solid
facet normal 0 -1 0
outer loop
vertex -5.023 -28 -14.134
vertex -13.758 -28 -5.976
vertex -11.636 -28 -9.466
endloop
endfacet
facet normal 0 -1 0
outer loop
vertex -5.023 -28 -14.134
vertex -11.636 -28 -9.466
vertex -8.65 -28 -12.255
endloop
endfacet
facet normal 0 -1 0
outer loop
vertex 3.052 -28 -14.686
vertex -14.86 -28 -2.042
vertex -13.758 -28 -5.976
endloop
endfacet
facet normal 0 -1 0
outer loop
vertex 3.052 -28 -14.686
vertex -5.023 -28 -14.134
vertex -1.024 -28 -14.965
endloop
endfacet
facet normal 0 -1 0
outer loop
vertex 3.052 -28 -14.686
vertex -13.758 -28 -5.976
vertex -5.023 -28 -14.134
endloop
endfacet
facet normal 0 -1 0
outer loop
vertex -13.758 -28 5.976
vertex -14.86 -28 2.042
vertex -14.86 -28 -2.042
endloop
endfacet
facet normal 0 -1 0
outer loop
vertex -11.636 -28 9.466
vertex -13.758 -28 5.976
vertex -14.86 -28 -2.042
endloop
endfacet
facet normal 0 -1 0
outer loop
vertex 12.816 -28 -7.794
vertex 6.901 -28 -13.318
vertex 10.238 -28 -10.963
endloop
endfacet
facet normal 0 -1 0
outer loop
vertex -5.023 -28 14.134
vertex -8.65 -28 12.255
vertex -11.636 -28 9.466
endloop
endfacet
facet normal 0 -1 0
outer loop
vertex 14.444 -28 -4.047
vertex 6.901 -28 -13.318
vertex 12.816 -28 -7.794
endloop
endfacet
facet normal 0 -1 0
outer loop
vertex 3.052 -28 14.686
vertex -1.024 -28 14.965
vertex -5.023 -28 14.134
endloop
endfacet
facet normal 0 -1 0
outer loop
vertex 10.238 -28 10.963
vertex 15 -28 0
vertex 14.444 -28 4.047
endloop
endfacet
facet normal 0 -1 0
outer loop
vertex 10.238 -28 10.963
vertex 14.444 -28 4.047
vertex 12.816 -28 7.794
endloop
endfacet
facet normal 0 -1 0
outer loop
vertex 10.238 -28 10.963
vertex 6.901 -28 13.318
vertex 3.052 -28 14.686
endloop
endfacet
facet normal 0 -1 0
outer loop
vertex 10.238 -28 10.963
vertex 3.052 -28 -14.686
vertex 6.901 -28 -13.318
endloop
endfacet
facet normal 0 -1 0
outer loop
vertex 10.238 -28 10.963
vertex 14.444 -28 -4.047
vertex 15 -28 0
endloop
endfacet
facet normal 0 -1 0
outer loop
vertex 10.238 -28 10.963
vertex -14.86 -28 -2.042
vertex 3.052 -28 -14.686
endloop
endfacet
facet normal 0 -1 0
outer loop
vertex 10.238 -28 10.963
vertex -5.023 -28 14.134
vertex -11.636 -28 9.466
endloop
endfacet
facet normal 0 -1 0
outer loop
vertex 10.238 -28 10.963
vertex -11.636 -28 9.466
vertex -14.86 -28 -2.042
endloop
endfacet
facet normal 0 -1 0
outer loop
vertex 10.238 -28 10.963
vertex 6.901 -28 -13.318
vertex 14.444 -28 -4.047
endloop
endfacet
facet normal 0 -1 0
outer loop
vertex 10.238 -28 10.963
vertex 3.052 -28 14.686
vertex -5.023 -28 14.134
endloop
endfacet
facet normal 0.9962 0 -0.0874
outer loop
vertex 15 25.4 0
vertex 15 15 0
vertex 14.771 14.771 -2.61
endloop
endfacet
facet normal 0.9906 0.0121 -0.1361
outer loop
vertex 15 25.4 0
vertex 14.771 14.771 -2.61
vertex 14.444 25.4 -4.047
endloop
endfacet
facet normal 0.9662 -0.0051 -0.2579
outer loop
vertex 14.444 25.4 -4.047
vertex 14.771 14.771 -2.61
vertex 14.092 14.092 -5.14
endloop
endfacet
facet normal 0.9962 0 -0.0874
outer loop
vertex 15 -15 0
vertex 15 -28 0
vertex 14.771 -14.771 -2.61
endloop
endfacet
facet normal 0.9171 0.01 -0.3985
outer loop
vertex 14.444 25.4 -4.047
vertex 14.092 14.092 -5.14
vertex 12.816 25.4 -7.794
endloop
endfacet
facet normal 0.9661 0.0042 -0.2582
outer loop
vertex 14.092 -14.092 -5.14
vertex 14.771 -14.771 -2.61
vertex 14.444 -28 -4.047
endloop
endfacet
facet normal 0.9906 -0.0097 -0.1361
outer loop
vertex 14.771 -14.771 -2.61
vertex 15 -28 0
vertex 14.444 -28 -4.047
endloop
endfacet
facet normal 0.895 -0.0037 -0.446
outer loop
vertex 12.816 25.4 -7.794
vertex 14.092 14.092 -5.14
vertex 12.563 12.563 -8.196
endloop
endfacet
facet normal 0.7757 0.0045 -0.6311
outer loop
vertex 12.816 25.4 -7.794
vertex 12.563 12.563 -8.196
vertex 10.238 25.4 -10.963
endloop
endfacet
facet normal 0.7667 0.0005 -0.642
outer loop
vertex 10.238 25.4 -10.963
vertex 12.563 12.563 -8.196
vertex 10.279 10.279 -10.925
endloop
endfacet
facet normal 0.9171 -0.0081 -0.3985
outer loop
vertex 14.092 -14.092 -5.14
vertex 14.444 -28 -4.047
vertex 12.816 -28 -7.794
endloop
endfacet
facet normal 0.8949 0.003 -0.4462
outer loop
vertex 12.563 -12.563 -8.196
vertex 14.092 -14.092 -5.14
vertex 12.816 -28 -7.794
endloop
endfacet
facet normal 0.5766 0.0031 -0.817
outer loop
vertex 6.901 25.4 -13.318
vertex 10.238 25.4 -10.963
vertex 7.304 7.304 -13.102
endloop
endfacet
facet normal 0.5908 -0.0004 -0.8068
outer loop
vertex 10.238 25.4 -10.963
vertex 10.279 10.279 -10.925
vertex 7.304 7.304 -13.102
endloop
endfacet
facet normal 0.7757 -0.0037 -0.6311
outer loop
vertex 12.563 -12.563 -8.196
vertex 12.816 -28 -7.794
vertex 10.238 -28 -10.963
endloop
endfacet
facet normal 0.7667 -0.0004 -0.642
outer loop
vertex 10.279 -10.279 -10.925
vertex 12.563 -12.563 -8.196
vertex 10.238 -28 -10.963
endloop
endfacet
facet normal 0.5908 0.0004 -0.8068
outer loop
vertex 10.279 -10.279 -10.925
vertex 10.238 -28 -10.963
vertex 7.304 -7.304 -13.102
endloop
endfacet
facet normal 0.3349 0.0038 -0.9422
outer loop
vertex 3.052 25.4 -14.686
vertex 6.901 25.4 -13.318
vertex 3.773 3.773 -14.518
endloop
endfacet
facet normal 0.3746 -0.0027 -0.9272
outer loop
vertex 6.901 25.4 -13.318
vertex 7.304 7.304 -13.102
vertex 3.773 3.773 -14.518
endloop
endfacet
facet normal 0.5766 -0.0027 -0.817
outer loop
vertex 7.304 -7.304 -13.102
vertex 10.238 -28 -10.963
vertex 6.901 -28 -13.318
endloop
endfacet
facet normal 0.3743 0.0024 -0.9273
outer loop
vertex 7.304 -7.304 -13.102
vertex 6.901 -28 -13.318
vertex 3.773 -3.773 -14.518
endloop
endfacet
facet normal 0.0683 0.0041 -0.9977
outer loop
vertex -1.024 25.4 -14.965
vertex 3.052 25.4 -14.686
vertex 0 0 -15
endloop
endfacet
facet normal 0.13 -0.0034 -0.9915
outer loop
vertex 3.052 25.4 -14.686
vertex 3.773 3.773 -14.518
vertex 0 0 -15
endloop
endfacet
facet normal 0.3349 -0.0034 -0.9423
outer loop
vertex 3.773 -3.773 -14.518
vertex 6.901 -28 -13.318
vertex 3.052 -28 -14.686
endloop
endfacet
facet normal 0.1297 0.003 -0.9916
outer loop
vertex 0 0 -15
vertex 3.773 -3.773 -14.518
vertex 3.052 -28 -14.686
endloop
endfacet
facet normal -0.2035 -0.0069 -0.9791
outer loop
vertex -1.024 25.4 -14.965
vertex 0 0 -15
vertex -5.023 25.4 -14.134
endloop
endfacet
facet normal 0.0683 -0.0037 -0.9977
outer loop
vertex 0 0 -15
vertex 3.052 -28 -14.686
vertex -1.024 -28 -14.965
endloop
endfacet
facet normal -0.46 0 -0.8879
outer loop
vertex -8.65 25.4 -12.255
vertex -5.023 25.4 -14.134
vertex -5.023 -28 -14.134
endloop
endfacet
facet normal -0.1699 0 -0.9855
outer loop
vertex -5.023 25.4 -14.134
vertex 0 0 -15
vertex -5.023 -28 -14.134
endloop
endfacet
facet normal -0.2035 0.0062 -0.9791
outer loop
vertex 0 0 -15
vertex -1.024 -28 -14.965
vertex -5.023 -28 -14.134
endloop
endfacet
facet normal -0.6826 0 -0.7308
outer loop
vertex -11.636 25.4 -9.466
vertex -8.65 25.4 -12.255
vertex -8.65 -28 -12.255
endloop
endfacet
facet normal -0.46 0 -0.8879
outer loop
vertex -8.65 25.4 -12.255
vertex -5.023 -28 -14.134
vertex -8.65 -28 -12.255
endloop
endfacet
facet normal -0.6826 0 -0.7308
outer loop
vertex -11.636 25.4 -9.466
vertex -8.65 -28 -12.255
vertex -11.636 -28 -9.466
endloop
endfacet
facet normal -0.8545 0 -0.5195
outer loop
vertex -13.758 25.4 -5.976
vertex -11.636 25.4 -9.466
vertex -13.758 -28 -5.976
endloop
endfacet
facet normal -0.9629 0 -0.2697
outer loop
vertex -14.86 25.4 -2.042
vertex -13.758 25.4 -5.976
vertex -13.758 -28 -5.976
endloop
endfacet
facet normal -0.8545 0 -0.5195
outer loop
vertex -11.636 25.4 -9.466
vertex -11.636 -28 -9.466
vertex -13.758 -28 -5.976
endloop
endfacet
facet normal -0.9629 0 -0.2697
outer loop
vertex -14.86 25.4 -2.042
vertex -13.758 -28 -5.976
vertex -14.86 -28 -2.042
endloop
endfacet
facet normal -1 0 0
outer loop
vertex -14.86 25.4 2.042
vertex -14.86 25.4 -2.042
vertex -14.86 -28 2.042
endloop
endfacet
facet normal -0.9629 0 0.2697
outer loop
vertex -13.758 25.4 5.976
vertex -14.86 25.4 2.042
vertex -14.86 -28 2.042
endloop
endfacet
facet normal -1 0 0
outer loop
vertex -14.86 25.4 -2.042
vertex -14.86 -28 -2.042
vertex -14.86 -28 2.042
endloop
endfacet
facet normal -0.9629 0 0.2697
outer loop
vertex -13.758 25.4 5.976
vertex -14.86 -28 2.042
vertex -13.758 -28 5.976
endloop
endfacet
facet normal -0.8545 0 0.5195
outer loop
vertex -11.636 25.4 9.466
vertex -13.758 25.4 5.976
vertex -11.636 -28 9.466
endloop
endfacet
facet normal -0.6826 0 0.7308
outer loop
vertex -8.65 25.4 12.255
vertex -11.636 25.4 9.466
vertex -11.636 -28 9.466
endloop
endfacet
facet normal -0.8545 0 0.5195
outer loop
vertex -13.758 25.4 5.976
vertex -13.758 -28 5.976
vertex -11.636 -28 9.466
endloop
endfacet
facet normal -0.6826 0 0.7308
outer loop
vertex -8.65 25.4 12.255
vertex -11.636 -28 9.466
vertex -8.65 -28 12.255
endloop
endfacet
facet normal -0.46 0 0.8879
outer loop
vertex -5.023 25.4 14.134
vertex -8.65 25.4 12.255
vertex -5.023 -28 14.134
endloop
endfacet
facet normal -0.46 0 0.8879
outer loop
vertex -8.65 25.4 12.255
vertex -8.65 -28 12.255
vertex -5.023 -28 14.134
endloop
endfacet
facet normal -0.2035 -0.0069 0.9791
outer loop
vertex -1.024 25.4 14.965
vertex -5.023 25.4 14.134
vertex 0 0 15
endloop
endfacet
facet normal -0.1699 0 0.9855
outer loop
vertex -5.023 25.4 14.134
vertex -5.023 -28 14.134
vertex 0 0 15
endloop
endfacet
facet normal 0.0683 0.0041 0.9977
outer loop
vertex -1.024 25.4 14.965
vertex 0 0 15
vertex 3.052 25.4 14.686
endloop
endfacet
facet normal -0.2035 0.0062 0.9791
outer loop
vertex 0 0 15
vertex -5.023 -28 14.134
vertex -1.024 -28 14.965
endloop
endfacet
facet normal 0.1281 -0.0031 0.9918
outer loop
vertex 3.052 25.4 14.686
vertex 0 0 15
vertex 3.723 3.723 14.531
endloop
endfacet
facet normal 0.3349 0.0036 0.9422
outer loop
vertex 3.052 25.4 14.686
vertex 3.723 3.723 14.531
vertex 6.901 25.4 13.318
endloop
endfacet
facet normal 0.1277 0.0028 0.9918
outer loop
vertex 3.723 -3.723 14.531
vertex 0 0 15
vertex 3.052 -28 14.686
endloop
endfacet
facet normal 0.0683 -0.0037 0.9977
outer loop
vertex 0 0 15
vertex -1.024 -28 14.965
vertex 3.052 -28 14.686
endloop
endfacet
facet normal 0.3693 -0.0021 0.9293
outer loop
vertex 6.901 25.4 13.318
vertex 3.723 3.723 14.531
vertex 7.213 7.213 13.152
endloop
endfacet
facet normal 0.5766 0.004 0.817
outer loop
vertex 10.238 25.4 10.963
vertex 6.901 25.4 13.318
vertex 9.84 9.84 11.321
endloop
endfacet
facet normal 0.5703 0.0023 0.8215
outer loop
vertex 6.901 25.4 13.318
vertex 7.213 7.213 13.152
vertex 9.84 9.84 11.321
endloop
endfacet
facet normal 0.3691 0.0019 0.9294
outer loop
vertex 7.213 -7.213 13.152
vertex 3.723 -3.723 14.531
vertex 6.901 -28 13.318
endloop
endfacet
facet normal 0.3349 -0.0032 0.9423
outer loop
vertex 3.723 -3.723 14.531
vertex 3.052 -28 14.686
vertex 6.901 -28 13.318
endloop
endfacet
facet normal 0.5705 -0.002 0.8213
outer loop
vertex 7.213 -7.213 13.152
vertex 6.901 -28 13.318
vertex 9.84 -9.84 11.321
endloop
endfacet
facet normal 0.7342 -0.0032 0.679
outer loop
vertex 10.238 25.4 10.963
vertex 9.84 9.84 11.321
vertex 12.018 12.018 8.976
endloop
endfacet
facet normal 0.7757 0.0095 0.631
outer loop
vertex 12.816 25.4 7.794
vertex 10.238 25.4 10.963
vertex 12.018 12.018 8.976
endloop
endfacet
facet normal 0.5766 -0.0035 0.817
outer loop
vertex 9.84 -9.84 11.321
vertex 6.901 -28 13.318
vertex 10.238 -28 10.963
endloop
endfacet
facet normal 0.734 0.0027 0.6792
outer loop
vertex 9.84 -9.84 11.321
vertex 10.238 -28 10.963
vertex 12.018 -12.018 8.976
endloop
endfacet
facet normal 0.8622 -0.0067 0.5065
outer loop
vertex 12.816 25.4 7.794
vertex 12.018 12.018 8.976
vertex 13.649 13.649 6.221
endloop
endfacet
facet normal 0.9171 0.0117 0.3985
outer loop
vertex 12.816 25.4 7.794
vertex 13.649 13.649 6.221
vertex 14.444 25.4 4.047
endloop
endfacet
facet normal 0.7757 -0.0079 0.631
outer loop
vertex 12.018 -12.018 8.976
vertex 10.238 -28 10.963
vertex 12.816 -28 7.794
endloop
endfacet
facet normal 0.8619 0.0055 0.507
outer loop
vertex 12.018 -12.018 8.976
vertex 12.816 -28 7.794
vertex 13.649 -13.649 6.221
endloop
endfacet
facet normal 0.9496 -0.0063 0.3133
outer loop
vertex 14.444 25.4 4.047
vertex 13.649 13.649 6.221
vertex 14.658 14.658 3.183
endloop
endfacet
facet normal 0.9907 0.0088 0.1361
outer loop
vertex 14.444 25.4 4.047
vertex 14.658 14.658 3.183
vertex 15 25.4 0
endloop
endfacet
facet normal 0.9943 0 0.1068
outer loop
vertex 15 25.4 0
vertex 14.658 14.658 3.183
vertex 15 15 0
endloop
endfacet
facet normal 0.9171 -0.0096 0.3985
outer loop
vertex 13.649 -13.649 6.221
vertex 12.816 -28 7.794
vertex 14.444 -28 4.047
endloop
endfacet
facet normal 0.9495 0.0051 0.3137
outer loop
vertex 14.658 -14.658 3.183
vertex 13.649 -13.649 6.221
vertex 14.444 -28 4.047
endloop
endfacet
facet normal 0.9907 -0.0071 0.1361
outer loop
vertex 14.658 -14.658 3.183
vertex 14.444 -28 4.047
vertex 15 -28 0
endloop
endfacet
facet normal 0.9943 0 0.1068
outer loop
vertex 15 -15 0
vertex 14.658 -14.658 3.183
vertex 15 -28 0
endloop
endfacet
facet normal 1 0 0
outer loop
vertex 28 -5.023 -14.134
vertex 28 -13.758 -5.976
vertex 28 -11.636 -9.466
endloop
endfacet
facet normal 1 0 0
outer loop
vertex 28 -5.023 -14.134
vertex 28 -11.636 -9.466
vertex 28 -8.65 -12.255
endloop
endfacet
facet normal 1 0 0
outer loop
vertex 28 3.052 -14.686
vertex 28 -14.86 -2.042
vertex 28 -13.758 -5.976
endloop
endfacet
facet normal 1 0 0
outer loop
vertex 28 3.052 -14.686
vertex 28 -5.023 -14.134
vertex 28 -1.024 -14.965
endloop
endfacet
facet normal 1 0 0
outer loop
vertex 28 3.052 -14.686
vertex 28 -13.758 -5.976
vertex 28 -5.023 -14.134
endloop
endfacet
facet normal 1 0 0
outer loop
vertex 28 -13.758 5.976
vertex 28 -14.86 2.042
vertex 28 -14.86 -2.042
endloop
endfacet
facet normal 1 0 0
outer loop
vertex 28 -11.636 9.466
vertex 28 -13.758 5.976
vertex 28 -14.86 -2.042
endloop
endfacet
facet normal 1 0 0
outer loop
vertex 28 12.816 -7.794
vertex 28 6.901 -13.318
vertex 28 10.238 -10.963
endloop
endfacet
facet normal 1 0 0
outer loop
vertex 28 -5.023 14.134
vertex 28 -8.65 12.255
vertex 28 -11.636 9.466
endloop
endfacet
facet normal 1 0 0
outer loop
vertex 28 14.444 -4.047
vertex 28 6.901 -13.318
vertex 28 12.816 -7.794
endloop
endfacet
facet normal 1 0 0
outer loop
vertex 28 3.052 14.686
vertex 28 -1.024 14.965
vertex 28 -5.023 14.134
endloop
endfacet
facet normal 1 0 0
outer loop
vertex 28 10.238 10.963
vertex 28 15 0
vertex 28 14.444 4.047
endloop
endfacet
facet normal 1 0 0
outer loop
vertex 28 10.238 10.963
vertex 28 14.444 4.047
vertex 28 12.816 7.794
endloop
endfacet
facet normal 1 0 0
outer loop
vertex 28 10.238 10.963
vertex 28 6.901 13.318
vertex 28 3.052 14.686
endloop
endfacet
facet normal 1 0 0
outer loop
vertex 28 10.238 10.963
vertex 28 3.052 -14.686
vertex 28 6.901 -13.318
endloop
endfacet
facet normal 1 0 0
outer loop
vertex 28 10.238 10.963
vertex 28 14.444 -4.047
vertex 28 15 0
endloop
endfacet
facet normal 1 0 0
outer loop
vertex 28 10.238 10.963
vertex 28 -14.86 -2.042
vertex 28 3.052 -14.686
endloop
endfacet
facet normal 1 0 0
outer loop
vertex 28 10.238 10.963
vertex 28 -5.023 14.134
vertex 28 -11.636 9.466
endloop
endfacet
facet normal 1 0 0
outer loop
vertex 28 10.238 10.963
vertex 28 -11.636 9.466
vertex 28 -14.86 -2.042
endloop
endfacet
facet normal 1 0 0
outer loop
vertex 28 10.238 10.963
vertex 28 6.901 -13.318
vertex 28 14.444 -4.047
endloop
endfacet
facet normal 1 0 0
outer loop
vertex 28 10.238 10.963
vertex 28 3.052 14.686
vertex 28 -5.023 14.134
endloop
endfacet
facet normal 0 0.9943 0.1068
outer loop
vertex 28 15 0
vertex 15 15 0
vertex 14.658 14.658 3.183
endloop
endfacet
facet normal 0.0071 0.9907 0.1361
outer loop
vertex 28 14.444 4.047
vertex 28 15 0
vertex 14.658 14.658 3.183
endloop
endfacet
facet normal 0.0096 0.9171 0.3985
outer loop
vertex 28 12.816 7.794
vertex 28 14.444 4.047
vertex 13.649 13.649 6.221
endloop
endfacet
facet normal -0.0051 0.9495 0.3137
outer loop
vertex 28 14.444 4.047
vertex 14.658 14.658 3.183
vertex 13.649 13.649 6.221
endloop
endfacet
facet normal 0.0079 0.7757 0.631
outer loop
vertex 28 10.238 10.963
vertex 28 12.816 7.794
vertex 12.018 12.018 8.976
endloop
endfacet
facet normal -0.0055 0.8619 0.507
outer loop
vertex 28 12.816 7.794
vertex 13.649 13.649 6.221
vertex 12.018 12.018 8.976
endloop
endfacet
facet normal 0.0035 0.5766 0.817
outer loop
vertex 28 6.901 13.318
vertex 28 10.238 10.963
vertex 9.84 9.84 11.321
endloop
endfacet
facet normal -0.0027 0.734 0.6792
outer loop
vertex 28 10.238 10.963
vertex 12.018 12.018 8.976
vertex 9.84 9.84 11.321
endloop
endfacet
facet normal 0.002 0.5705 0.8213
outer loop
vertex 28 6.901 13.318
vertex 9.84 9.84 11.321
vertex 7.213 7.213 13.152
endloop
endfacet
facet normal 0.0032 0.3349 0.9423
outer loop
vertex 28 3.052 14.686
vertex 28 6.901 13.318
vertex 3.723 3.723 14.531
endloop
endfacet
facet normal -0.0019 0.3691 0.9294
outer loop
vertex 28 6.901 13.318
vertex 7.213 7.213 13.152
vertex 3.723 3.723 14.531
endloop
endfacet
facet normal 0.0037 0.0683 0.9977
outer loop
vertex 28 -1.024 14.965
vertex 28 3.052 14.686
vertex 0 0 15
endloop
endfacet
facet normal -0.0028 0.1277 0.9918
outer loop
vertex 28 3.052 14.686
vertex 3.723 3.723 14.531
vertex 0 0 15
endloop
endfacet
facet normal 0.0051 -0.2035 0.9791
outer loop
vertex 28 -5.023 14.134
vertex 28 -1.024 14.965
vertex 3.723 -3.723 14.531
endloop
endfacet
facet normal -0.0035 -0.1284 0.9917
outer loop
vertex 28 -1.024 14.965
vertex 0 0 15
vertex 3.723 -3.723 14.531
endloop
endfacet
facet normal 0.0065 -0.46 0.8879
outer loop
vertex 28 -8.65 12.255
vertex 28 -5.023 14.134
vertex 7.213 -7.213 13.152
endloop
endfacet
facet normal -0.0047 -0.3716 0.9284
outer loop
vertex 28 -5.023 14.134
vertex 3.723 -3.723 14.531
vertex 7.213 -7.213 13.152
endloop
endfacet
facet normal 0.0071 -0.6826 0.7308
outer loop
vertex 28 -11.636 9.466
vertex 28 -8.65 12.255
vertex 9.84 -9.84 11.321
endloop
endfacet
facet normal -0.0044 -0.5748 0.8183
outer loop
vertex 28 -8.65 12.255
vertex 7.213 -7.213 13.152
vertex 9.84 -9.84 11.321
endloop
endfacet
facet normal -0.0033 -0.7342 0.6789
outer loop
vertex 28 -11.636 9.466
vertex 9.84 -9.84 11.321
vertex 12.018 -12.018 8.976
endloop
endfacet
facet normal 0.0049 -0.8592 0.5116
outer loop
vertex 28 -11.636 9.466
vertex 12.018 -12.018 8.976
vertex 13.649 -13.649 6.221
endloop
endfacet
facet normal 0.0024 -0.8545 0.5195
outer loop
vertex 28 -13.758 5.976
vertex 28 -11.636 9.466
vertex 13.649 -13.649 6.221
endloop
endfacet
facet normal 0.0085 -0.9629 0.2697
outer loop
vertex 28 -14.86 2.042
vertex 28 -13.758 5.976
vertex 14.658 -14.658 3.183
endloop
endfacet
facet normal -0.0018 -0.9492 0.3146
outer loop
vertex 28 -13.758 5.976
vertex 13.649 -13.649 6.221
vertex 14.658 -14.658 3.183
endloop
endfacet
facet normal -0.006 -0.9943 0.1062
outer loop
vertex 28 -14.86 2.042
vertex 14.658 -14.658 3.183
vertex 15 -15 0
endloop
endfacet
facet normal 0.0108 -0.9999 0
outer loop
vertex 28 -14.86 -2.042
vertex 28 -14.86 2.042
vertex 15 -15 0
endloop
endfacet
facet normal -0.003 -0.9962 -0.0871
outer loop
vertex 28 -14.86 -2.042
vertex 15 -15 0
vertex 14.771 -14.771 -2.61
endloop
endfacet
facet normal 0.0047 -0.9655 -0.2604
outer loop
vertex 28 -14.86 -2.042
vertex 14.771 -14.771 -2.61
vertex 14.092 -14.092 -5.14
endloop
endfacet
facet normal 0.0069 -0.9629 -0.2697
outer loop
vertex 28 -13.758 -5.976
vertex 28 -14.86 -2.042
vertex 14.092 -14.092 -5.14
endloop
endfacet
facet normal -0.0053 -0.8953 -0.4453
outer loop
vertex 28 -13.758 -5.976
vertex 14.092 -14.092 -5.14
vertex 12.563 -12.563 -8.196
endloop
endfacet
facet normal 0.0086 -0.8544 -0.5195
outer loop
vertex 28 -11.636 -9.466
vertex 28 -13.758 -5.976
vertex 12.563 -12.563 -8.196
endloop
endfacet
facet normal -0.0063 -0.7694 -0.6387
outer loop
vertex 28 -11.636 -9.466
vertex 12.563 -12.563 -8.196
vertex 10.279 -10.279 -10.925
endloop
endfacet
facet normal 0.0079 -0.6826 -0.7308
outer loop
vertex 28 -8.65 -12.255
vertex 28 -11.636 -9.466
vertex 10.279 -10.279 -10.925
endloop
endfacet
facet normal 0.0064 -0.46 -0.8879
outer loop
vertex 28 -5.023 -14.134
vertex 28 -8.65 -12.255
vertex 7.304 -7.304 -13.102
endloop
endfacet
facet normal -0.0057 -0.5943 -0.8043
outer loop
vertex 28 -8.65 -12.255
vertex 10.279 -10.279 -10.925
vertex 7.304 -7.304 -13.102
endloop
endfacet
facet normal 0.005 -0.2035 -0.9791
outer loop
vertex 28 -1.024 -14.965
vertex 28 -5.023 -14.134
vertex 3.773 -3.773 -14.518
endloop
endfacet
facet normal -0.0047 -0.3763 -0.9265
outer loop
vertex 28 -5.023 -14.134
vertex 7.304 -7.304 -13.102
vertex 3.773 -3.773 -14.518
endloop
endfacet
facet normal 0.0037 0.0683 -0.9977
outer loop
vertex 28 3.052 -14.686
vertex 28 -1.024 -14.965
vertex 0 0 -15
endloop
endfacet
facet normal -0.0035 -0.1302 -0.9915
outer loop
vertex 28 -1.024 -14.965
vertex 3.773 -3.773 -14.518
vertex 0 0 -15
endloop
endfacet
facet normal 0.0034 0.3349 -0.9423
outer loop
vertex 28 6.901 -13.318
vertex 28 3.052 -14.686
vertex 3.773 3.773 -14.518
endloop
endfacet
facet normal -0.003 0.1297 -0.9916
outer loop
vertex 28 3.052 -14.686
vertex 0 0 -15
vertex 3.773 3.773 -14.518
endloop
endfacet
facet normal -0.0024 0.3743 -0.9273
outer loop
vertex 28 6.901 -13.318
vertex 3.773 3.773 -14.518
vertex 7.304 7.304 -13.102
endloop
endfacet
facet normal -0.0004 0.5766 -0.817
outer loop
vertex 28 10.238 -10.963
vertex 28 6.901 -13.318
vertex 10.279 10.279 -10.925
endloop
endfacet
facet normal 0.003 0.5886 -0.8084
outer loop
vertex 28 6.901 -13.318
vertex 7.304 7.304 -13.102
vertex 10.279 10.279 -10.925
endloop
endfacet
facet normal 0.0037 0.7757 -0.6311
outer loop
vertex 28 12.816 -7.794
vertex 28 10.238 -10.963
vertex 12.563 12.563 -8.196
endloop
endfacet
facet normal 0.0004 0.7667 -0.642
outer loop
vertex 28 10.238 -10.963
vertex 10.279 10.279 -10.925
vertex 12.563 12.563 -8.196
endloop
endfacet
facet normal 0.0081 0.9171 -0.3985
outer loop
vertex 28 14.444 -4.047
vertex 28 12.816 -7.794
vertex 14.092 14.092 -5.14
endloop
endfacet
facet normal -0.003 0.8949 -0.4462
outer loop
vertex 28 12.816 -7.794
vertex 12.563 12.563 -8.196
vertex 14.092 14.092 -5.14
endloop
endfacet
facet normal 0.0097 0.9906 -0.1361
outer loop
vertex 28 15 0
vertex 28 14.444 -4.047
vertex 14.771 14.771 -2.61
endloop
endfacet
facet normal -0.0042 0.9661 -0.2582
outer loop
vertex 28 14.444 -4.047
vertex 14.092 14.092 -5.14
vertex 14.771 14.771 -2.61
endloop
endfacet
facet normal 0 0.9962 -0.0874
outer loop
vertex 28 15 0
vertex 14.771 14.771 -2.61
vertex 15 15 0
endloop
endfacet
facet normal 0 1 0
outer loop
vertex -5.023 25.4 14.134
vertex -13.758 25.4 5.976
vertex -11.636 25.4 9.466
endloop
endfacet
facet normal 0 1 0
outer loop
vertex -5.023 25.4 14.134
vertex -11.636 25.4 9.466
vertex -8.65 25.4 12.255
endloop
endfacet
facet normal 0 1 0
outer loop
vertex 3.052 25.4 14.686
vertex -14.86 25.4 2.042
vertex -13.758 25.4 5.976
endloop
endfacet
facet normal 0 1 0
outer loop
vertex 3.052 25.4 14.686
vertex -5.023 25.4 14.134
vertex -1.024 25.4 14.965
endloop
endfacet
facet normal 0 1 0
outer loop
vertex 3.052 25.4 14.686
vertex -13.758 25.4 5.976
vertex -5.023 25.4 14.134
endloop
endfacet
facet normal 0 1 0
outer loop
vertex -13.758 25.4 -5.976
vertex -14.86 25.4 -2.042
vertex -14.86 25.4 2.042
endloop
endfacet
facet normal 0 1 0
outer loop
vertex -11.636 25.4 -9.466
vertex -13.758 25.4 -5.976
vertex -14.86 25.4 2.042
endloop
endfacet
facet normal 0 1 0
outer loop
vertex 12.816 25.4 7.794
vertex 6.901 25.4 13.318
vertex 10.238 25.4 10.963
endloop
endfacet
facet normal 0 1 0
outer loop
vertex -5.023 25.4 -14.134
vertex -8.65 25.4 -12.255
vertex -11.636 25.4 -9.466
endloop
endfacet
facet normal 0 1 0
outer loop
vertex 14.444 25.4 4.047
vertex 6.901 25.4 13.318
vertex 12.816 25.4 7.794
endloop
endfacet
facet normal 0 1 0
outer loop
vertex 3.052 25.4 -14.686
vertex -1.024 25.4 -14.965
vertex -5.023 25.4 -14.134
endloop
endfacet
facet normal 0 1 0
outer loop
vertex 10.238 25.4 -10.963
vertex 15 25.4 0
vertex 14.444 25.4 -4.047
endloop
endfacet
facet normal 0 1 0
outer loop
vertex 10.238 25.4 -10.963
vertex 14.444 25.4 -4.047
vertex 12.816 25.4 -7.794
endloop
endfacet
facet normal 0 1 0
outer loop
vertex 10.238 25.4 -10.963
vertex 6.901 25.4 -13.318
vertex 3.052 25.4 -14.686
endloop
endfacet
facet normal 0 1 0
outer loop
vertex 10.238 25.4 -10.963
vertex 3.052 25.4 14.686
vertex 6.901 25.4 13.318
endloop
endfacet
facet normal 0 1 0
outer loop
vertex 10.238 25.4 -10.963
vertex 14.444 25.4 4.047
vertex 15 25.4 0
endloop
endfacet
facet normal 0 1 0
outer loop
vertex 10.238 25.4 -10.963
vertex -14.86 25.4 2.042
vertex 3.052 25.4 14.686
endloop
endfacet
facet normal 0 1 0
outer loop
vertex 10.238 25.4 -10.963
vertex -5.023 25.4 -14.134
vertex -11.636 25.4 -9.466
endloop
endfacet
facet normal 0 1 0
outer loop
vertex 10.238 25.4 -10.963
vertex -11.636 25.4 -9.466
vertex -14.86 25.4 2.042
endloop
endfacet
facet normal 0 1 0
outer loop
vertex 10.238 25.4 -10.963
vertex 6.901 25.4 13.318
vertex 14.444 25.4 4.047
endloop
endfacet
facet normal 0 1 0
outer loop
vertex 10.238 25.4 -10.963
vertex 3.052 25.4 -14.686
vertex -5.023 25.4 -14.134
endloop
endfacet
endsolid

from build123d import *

# Parameters (mm, degrees)
F0_R      = 15
F1_DEPTH  = 28
F1_FACE_R = 15
F2_DEPTH  = 25.4
F3_R      = 15
F4_DEPTH  = 28


with BuildPart() as f1:
    # F0 (on Front) → F1 (new body)
    with BuildSketch(Plane.XZ):
        Circle(F0_R)
    extrude(amount=F1_DEPTH)

    # F1_face (on face) → F2 (join)
    with BuildSketch(Plane(origin=(0, 0, 0), x_dir=(1, 0, 0), z_dir=(0, 1, 0))):
        Circle(F1_FACE_R)
    extrude(amount=F2_DEPTH)

    # F3 (on Right) → F4 (join)
    with BuildSketch(Plane.YZ):
        Circle(F3_R)
    extrude(amount=F4_DEPTH)


solid = f1.part
